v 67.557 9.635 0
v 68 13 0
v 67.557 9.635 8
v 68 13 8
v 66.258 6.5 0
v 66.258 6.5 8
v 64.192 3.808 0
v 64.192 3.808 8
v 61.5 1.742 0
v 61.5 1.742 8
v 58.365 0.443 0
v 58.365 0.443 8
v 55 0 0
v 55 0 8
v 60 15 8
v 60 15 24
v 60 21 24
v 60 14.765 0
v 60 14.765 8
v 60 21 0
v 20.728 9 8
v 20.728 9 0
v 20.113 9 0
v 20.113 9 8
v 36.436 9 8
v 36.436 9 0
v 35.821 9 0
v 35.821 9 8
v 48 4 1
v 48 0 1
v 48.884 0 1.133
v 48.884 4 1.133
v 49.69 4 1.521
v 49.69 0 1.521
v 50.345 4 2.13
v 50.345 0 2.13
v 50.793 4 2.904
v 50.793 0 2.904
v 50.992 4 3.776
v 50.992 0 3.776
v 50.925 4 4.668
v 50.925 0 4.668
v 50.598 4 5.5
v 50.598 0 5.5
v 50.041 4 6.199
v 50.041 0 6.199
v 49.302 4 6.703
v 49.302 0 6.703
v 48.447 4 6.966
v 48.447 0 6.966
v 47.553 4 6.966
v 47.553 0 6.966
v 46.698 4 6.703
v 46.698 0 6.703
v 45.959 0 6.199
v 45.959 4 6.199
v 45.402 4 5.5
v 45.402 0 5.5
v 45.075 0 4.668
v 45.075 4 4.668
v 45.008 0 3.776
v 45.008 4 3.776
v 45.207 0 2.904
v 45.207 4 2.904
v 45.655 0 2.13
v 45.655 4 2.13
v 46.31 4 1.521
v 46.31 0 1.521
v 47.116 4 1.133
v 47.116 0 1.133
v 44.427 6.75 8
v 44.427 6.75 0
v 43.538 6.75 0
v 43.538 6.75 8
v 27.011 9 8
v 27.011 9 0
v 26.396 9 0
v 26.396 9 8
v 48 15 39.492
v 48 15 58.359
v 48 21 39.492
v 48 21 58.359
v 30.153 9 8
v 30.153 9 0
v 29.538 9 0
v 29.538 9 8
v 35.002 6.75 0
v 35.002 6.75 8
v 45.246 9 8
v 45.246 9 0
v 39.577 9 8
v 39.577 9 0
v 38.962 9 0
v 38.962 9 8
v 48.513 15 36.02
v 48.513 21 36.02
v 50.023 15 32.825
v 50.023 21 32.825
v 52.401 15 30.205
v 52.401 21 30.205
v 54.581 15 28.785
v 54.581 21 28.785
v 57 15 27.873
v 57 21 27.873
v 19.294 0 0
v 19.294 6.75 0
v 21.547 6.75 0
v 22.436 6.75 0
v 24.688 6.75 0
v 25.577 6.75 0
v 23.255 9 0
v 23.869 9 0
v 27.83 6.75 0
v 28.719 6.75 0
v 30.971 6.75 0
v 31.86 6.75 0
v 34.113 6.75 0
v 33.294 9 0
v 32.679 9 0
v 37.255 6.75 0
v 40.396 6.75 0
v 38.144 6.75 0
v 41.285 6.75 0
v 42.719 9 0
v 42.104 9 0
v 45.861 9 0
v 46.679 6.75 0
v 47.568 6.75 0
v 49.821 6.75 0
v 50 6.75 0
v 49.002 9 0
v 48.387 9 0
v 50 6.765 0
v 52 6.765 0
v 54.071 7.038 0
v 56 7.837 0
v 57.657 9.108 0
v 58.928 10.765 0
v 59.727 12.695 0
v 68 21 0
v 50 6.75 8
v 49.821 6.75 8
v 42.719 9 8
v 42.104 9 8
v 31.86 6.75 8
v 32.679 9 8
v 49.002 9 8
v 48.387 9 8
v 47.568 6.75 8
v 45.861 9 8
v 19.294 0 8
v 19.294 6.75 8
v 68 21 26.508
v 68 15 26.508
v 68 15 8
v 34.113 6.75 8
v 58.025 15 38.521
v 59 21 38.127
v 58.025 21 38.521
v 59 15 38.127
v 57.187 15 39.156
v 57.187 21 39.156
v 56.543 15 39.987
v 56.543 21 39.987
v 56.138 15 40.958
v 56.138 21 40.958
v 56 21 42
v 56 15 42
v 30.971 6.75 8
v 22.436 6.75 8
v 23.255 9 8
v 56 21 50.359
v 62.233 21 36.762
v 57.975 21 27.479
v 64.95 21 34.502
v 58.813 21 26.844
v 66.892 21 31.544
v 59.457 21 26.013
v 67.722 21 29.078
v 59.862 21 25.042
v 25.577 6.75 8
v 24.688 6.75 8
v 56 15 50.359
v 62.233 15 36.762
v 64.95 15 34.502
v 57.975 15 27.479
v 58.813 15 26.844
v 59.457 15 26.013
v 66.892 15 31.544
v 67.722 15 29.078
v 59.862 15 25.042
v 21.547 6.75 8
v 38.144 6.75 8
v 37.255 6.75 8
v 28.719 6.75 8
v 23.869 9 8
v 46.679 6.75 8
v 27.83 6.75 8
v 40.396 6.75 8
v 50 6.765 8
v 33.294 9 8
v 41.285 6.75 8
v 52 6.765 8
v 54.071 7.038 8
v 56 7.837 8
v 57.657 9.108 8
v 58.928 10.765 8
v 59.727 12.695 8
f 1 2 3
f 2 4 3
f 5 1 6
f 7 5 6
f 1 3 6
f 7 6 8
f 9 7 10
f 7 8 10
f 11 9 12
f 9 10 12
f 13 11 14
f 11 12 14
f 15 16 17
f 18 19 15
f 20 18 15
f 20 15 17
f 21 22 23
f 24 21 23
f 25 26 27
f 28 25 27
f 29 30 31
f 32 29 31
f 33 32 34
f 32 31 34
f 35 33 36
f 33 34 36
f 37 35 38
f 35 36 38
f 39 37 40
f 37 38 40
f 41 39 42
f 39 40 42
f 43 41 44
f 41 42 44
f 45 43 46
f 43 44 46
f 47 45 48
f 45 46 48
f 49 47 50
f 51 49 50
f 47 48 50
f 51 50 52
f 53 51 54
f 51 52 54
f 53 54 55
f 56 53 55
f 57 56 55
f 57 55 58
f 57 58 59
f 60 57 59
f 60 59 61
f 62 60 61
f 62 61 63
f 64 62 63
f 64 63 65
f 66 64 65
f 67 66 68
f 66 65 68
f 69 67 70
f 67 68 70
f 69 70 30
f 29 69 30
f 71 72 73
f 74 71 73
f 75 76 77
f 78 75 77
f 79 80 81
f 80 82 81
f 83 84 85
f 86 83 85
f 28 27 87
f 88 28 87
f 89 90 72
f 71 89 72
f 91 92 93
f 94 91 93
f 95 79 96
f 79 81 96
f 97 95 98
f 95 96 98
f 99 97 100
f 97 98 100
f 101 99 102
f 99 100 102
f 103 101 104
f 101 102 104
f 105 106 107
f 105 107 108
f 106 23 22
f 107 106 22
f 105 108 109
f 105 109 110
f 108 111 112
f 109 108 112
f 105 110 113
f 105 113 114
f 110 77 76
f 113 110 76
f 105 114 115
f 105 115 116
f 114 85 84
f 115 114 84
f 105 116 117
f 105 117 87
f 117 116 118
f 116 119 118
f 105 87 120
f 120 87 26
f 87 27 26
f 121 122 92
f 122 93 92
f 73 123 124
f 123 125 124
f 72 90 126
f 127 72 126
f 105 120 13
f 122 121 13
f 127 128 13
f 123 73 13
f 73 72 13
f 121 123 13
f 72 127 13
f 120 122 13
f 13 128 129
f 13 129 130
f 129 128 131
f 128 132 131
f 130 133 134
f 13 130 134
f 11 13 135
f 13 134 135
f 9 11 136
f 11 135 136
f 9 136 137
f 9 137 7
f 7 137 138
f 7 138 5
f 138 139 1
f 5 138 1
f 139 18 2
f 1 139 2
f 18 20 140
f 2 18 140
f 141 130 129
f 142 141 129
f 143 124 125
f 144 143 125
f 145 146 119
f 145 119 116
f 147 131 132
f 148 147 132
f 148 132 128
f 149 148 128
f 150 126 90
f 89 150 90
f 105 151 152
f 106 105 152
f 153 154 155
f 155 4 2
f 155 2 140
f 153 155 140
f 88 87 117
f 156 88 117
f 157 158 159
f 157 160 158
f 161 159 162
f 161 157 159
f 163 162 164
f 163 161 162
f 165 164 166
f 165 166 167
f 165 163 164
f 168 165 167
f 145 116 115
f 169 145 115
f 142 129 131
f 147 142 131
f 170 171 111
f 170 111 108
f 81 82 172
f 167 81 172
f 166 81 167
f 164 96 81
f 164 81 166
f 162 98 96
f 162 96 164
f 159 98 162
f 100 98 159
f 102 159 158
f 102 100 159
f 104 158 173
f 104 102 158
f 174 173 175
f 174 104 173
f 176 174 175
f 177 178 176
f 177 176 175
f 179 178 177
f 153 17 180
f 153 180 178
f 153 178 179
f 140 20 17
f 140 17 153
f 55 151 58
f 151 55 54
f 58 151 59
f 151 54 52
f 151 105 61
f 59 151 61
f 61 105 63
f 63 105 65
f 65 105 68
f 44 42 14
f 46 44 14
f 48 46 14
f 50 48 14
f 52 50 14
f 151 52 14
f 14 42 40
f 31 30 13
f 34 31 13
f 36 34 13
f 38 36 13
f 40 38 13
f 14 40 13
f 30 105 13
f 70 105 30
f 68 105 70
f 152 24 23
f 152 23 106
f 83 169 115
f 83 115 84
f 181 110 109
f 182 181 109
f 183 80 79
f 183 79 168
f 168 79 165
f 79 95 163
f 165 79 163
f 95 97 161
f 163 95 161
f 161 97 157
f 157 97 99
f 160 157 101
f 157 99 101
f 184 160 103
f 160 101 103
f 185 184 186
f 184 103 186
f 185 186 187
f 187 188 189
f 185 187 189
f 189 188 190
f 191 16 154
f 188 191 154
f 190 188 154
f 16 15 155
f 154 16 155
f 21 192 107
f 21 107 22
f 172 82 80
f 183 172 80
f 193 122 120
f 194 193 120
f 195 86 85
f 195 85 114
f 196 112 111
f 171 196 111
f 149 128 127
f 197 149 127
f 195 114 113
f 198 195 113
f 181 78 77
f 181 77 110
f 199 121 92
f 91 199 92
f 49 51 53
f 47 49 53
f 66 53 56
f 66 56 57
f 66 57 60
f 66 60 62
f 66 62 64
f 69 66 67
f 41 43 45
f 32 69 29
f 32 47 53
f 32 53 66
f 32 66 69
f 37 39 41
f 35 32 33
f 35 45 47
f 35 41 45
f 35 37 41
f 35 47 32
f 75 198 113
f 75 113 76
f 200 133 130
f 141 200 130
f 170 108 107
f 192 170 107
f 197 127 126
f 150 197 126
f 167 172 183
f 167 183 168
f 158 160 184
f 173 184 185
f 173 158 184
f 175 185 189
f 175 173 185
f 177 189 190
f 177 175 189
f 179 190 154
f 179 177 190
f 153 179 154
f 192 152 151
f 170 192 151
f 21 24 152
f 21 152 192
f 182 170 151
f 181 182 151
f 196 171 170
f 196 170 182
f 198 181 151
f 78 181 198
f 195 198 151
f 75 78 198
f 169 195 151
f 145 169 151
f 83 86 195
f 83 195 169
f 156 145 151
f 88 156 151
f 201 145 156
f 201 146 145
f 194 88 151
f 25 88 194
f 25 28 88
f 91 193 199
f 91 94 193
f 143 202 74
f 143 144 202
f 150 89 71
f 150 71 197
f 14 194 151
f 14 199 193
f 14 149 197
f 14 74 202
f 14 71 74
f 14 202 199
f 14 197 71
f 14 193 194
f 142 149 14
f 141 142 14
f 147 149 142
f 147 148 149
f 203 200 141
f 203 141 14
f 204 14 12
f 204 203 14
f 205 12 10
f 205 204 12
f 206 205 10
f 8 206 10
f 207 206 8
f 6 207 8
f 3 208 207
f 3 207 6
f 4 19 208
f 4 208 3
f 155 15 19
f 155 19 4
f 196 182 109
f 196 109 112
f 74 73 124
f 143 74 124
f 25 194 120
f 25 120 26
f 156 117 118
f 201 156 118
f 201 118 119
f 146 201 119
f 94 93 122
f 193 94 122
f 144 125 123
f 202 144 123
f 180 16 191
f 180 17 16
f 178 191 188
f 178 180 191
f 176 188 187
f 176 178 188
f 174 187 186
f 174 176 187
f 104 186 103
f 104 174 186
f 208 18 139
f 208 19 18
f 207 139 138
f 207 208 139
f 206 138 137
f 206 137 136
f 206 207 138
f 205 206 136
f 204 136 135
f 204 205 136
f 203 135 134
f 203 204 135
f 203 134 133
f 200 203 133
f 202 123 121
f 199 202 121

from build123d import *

# Parameters (mm, degrees)
BLANKSKE_W                  = 50
BLANKSKE_H                  = 9
BLANK_DEPTH                 = 12
TOOTHCUTSIM_DEPTH           = 53.201532545
TEETHCUTS_COUNT             = 17
TEETHCUTS_PITCH             = 3.14159265
SKETCH1_W                   = 50
SKETCH1_H                   = 10.518808777
CUT_EXTRUDE1_DEPTH          = 4
SKETCH2_W                   = 8
SKETCH2_H                   = 6.765098998
BOSS_EXTRUDE1_DEPTH         = 10
SKETCH3_W                   = 8
SKETCH3_H                   = 21
BOSS_EXTRUDE2_DEPTH         = 8
SKETCH4_W                   = 8
SKETCH4_H                   = 6
BOSS_EXTRUDE3_DEPTH         = 30
SKETCH5_W                   = 10
SKETCH5_H                   = 6
BOSS_EXTRUDE4_DEPTH         = 12
BODY_MOVE_COPY3_START       = -12
BODY_MOVE_COPY3_DEPTH       = 12
BODY_MOVE_COPY3_START_2     = 16
BODY_MOVE_COPY3_2_OUTLINE_W = 12
BODY_MOVE_COPY3_2_OUTLINE_H = 6
BODY_MOVE_COPY3_2_DEPTH     = 10
BODY_MOVE_COPY3_3_DEPTH     = 8
BODY_MOVE_COPY3_START_3     = 28
BODY_MOVE_COPY3_4_OUTLINE_W = 20
BODY_MOVE_COPY3_4_OUTLINE_H = 6
BODY_MOVE_COPY3_4_DEPTH     = 10
BODY_MOVE_COPY3_START_4     = 26
BODY_MOVE_COPY3_5_OUTLINE_W = 8
BODY_MOVE_COPY3_5_OUTLINE_H = 6
BODY_MOVE_COPY3_5_DEPTH     = 2
SKETCH8_R                   = 3
CUT_EXTRUDE2_DEPTH          = 4
FILLET1_R                   = 8
FILLET2_R                   = 13
SKETCH9_W                   = 8
SKETCH9_H                   = 20.359047751
BOSS_EXTRUDE5_DEPTH         = 6
FILLET3_R                   = 4
FILLET4_R                   = 12
CUT_EXTRUDE3_DEPTH          = 10
SKETCH11_W                  = 0.88887074
SKETCH11_H                  = 6.79103927
CUT_EXTRUDE4_DEPTH          = 10
CHAMFER10_SIZE              = 8


# Read off the part's stored shape, not the designer's step: Body-Move/Copy3
with BuildPart() as part:
    # BlankSke → Blank (new body)
    with BuildSketch(Plane.XY):
        with Locations((25, 4.5)):
            Rectangle(BLANKSKE_W, BLANKSKE_H)
    extrude(amount=-BLANK_DEPTH)

    # TooCutSkeSim → ToothCutSim (cut, through all)
    with BuildSketch(Plane.XY):
        Polygon((0.44443537, 6.75), (-0.44443537, 6.75), (-1.272613241, 9.0254), (1.272613241, 9.0254), align=None)
    toothcutsim = extrude(amount=-TOOTHCUTSIM_DEPTH, mode=Mode.SUBTRACT)

    # TeethCuts: ToothCutSim ×17
    with Locations(*[(i * TEETHCUTS_PITCH, 0, 0) for i in range(1, TEETHCUTS_COUNT)]):
        add(toothcutsim, mode=Mode.SUBTRACT)

    # Sketch1 → Cut-Extrude1 (cut)
    with BuildSketch(Plane.XY):
        with Locations((25, 5.259404389)):
            Rectangle(SKETCH1_W, SKETCH1_H)
    extrude(amount=-CUT_EXTRUDE1_DEPTH, mode=Mode.SUBTRACT)

    # Sketch2 → Boss-Extrude1 (add)
    with BuildSketch(Plane(origin=(50, 0, 0), x_dir=(0, 0, -1), z_dir=(1, 0, 0))):
        with Locations((8, 3.382549499)):
            Rectangle(SKETCH2_W, SKETCH2_H)
    extrude(amount=BOSS_EXTRUDE1_DEPTH)

    # Sketch3 → Boss-Extrude2 (add)
    with BuildSketch(Plane.XY.offset(-4)):
        with Locations((64, 10.5)):
            Rectangle(SKETCH3_W, SKETCH3_H)
    extrude(amount=-BOSS_EXTRUDE2_DEPTH)

    # Sketch4 → Boss-Extrude3 (add)
    with BuildSketch(Plane.XY.offset(-4)):
        with Locations((64, 18)):
            Rectangle(SKETCH4_W, SKETCH4_H)
    extrude(amount=BOSS_EXTRUDE3_DEPTH)

    # Sketch5 → Boss-Extrude4 (add)
    with BuildSketch(Plane.ZY.offset(-60)):
        with Locations((21, 18)):
            Rectangle(SKETCH5_W, SKETCH5_H)
    extrude(amount=BOSS_EXTRUDE4_DEPTH)

    # Body-Move/Copy3 outline → Body-Move/Copy3 (cut)
    with BuildSketch(Plane.XY.offset(BODY_MOVE_COPY3_START)):
        Polygon((68, 21), (60, 21), (60, 6.765098998), (50, 6.765098998), (50, 6.75), (49.82104703, 6.75), (49.002114003, 9), (48.387258147, 9), (47.56832512, 6.75), (46.67945438, 6.75), (45.860521353, 9), (45.245665497, 9), (44.42673247, 6.75), (43.53786173, 6.75), (42.718928703, 9), (42.104072847, 9), (41.28513982, 6.75), (40.39626908, 6.75), (39.577336053, 9), (38.962480197, 9), (38.14354717, 6.75), (37.25467643, 6.75), (36.435743403, 9), (35.820887547, 9), (35.00195452, 6.75), (34.11308378, 6.75), (33.294150753, 9), (32.679294897, 9), (31.86036187, 6.75), (30.97149113, 6.75), (30.152558103, 9), (29.537702247, 9), (28.71876922, 6.75), (27.82989848, 6.75), (27.010965453, 9), (26.396109597, 9), (25.57717657, 6.75), (24.68830583, 6.75), (23.869372803, 9), (23.254516947, 9), (22.43558392, 6.75), (21.54671318, 6.75), (20.727780153, 9), (20.112924297, 9), (19.29399127, 6.75), (18.40512053, 6.75), (17.586187503, 9), (16.971331647, 9), (16.15239862, 6.75), (15.26352788, 6.75), (14.444594853, 9), (13.829738997, 9), (13.01080597, 6.75), (12.12193523, 6.75), (11.303002203, 9), (10.688146347, 9), (9.86921332, 6.75), (8.98034258, 6.75), (8.161409553, 9), (7.546553697, 9), (6.72762067, 6.75), (5.83874993, 6.75), (5.019816903, 9), (4.404961047, 9), (3.58602802, 6.75), (2.69715728, 6.75), (1.878224253, 9), (1.263368397, 9), (0.44443537, 6.75), (0, 6.75), (0, 0), (68, 0), align=None)
    extrude(amount=BODY_MOVE_COPY3_DEPTH, mode=Mode.SUBTRACT)

    # Body-Move_Copy3 2 outline → Body-Move_Copy3 2 (cut)
    with BuildSketch(Plane.XY.offset(BODY_MOVE_COPY3_START_2)):
        with Locations((54, 18)):
            Rectangle(BODY_MOVE_COPY3_2_OUTLINE_W, BODY_MOVE_COPY3_2_OUTLINE_H)
    extrude(amount=BODY_MOVE_COPY3_2_DEPTH, mode=Mode.SUBTRACT)

    # Body-Move_Copy3 3 outline → Body-Move_Copy3 3 (add)
    with BuildSketch(Plane.XY):
        Polygon((68, 15), (60, 15), (60, 6.765098998), (50, 6.765098998), (50, 6.75), (49.82104703, 6.75), (49.002114003, 9), (48.387258147, 9), (47.56832512, 6.75), (46.67945438, 6.75), (45.860521353, 9), (45.245665497, 9), (44.42673247, 6.75), (43.53786173, 6.75), (42.718928703, 9), (42.104072847, 9), (41.28513982, 6.75), (40.39626908, 6.75), (39.577336053, 9), (38.962480197, 9), (38.14354717, 6.75), (37.25467643, 6.75), (36.435743403, 9), (35.820887547, 9), (35.00195452, 6.75), (34.11308378, 6.75), (33.294150753, 9), (32.679294897, 9), (31.86036187, 6.75), (30.97149113, 6.75), (30.152558103, 9), (29.537702247, 9), (28.71876922, 6.75), (27.82989848, 6.75), (27.010965453, 9), (26.396109597, 9), (25.57717657, 6.75), (24.68830583, 6.75), (23.869372803, 9), (23.254516947, 9), (22.43558392, 6.75), (21.54671318, 6.75), (20.727780153, 9), (20.112924297, 9), (19.29399127, 6.75), (18.40512053, 6.75), (17.586187503, 9), (16.971331647, 9), (16.15239862, 6.75), (15.26352788, 6.75), (14.444594853, 9), (13.829738997, 9), (13.01080597, 6.75), (12.12193523, 6.75), (11.303002203, 9), (10.688146347, 9), (9.86921332, 6.75), (8.98034258, 6.75), (8.161409553, 9), (7.546553697, 9), (6.72762067, 6.75), (5.83874993, 6.75), (5.019816903, 9), (4.404961047, 9), (3.58602802, 6.75), (2.69715728, 6.75), (1.878224253, 9), (1.263368397, 9), (0.44443537, 6.75), (0, 6.75), (0, 0), (68, 0), align=None)
    extrude(amount=BODY_MOVE_COPY3_3_DEPTH)



with BuildPart() as body_2:
    # Body-Move_Copy3 4 outline → Body-Move_Copy3 4 (new body)
    with BuildSketch(Plane.XY.offset(BODY_MOVE_COPY3_START_3)):
        with Locations((58, 18)):
            Rectangle(BODY_MOVE_COPY3_4_OUTLINE_W, BODY_MOVE_COPY3_4_OUTLINE_H)
    extrude(amount=BODY_MOVE_COPY3_4_DEPTH)


with BuildPart() as part_1:
    add(part.part)

    add(body_2.part)  # Body-Move_Copy3 5 merges body 2
    # Body-Move_Copy3 5 outline → Body-Move_Copy3 5 (add)
    with BuildSketch(Plane.XY.offset(BODY_MOVE_COPY3_START_4)):
        with Locations((64, 18)):
            Rectangle(BODY_MOVE_COPY3_5_OUTLINE_W, BODY_MOVE_COPY3_5_OUTLINE_H)
    extrude(amount=BODY_MOVE_COPY3_5_DEPTH)

    # Sketch8 → Cut-Extrude2 (cut)
    with BuildSketch(Plane.XZ):
        with Locations(Location((48, 4, 0), (0, 0, 270))):
            Circle(SKETCH8_R)
    extrude(amount=-CUT_EXTRUDE2_DEPTH, mode=Mode.SUBTRACT)

    # Fillet1
    fillet1_edges = [part_1.edges().sort_by_distance(p)[0] for p in [
        (60, 6.765098998, 4),
    ]]
    fillet(fillet1_edges, radius=FILLET1_R)

    # Fillet2
    fillet2_edges = [part_1.edges().sort_by_distance(p)[0] for p in [
        (68, 0, 4),
    ]]
    fillet(fillet2_edges, radius=FILLET2_R)

    # Sketch9 → Boss-Extrude5 (add)
    with BuildSketch(Plane(origin=(0, 21, 0), x_dir=(1, 0, 0), z_dir=(0, 1, 0))):
        with Locations((52, -48.179523876)):
            Rectangle(SKETCH9_W, SKETCH9_H)
    extrude(amount=-BOSS_EXTRUDE5_DEPTH)

    # Fillet3
    fillet3_edges = [part_1.edges().sort_by_distance(p)[0] for p in [
        (60, 18, 28),
        (56, 18, 38),
    ]]
    fillet(fillet3_edges, radius=FILLET3_R)

    # Fillet4
    fillet4_edges = [part_1.edges().sort_by_distance(p)[0] for p in [
        (48, 18, 28),
        (68, 18, 38),
    ]]
    fillet(fillet4_edges, radius=FILLET4_R)

    # Sketch10 → Cut-Extrude3 (cut)
    with BuildSketch(Plane(origin=(0, 0, 0), x_dir=(-1, 0, 0), z_dir=(0, 0, -1))):
        Polygon((-18.40512053, 6.75), (-18.40512053, 0), (5.217531279, 0), (5.217531279, 6.75), (5.217531279, 11.737070905), (-18.40512053, 11.737070905), align=None)
    extrude(amount=-CUT_EXTRUDE3_DEPTH, mode=Mode.SUBTRACT)

    # Sketch11 → Cut-Extrude4 (cut)
    with BuildSketch(Plane(origin=(0, 0, 0), x_dir=(-1, 0, 0), z_dir=(0, 0, -1))):
        with Locations((-18.8495559, 3.354480365)):
            Rectangle(SKETCH11_W, SKETCH11_H)
    extrude(amount=-CUT_EXTRUDE4_DEPTH, mode=Mode.SUBTRACT)

    # Chamfer10
    chamfer10_edges = [part_1.edges().sort_by_distance(p)[0] for p in [
        (56, 18, 58.359047751),
    ]]
    chamfer(chamfer10_edges, length=CHAMFER10_SIZE - 0.0001)  # a hair under: the kernel refuses the full size


solid = part_1.part
